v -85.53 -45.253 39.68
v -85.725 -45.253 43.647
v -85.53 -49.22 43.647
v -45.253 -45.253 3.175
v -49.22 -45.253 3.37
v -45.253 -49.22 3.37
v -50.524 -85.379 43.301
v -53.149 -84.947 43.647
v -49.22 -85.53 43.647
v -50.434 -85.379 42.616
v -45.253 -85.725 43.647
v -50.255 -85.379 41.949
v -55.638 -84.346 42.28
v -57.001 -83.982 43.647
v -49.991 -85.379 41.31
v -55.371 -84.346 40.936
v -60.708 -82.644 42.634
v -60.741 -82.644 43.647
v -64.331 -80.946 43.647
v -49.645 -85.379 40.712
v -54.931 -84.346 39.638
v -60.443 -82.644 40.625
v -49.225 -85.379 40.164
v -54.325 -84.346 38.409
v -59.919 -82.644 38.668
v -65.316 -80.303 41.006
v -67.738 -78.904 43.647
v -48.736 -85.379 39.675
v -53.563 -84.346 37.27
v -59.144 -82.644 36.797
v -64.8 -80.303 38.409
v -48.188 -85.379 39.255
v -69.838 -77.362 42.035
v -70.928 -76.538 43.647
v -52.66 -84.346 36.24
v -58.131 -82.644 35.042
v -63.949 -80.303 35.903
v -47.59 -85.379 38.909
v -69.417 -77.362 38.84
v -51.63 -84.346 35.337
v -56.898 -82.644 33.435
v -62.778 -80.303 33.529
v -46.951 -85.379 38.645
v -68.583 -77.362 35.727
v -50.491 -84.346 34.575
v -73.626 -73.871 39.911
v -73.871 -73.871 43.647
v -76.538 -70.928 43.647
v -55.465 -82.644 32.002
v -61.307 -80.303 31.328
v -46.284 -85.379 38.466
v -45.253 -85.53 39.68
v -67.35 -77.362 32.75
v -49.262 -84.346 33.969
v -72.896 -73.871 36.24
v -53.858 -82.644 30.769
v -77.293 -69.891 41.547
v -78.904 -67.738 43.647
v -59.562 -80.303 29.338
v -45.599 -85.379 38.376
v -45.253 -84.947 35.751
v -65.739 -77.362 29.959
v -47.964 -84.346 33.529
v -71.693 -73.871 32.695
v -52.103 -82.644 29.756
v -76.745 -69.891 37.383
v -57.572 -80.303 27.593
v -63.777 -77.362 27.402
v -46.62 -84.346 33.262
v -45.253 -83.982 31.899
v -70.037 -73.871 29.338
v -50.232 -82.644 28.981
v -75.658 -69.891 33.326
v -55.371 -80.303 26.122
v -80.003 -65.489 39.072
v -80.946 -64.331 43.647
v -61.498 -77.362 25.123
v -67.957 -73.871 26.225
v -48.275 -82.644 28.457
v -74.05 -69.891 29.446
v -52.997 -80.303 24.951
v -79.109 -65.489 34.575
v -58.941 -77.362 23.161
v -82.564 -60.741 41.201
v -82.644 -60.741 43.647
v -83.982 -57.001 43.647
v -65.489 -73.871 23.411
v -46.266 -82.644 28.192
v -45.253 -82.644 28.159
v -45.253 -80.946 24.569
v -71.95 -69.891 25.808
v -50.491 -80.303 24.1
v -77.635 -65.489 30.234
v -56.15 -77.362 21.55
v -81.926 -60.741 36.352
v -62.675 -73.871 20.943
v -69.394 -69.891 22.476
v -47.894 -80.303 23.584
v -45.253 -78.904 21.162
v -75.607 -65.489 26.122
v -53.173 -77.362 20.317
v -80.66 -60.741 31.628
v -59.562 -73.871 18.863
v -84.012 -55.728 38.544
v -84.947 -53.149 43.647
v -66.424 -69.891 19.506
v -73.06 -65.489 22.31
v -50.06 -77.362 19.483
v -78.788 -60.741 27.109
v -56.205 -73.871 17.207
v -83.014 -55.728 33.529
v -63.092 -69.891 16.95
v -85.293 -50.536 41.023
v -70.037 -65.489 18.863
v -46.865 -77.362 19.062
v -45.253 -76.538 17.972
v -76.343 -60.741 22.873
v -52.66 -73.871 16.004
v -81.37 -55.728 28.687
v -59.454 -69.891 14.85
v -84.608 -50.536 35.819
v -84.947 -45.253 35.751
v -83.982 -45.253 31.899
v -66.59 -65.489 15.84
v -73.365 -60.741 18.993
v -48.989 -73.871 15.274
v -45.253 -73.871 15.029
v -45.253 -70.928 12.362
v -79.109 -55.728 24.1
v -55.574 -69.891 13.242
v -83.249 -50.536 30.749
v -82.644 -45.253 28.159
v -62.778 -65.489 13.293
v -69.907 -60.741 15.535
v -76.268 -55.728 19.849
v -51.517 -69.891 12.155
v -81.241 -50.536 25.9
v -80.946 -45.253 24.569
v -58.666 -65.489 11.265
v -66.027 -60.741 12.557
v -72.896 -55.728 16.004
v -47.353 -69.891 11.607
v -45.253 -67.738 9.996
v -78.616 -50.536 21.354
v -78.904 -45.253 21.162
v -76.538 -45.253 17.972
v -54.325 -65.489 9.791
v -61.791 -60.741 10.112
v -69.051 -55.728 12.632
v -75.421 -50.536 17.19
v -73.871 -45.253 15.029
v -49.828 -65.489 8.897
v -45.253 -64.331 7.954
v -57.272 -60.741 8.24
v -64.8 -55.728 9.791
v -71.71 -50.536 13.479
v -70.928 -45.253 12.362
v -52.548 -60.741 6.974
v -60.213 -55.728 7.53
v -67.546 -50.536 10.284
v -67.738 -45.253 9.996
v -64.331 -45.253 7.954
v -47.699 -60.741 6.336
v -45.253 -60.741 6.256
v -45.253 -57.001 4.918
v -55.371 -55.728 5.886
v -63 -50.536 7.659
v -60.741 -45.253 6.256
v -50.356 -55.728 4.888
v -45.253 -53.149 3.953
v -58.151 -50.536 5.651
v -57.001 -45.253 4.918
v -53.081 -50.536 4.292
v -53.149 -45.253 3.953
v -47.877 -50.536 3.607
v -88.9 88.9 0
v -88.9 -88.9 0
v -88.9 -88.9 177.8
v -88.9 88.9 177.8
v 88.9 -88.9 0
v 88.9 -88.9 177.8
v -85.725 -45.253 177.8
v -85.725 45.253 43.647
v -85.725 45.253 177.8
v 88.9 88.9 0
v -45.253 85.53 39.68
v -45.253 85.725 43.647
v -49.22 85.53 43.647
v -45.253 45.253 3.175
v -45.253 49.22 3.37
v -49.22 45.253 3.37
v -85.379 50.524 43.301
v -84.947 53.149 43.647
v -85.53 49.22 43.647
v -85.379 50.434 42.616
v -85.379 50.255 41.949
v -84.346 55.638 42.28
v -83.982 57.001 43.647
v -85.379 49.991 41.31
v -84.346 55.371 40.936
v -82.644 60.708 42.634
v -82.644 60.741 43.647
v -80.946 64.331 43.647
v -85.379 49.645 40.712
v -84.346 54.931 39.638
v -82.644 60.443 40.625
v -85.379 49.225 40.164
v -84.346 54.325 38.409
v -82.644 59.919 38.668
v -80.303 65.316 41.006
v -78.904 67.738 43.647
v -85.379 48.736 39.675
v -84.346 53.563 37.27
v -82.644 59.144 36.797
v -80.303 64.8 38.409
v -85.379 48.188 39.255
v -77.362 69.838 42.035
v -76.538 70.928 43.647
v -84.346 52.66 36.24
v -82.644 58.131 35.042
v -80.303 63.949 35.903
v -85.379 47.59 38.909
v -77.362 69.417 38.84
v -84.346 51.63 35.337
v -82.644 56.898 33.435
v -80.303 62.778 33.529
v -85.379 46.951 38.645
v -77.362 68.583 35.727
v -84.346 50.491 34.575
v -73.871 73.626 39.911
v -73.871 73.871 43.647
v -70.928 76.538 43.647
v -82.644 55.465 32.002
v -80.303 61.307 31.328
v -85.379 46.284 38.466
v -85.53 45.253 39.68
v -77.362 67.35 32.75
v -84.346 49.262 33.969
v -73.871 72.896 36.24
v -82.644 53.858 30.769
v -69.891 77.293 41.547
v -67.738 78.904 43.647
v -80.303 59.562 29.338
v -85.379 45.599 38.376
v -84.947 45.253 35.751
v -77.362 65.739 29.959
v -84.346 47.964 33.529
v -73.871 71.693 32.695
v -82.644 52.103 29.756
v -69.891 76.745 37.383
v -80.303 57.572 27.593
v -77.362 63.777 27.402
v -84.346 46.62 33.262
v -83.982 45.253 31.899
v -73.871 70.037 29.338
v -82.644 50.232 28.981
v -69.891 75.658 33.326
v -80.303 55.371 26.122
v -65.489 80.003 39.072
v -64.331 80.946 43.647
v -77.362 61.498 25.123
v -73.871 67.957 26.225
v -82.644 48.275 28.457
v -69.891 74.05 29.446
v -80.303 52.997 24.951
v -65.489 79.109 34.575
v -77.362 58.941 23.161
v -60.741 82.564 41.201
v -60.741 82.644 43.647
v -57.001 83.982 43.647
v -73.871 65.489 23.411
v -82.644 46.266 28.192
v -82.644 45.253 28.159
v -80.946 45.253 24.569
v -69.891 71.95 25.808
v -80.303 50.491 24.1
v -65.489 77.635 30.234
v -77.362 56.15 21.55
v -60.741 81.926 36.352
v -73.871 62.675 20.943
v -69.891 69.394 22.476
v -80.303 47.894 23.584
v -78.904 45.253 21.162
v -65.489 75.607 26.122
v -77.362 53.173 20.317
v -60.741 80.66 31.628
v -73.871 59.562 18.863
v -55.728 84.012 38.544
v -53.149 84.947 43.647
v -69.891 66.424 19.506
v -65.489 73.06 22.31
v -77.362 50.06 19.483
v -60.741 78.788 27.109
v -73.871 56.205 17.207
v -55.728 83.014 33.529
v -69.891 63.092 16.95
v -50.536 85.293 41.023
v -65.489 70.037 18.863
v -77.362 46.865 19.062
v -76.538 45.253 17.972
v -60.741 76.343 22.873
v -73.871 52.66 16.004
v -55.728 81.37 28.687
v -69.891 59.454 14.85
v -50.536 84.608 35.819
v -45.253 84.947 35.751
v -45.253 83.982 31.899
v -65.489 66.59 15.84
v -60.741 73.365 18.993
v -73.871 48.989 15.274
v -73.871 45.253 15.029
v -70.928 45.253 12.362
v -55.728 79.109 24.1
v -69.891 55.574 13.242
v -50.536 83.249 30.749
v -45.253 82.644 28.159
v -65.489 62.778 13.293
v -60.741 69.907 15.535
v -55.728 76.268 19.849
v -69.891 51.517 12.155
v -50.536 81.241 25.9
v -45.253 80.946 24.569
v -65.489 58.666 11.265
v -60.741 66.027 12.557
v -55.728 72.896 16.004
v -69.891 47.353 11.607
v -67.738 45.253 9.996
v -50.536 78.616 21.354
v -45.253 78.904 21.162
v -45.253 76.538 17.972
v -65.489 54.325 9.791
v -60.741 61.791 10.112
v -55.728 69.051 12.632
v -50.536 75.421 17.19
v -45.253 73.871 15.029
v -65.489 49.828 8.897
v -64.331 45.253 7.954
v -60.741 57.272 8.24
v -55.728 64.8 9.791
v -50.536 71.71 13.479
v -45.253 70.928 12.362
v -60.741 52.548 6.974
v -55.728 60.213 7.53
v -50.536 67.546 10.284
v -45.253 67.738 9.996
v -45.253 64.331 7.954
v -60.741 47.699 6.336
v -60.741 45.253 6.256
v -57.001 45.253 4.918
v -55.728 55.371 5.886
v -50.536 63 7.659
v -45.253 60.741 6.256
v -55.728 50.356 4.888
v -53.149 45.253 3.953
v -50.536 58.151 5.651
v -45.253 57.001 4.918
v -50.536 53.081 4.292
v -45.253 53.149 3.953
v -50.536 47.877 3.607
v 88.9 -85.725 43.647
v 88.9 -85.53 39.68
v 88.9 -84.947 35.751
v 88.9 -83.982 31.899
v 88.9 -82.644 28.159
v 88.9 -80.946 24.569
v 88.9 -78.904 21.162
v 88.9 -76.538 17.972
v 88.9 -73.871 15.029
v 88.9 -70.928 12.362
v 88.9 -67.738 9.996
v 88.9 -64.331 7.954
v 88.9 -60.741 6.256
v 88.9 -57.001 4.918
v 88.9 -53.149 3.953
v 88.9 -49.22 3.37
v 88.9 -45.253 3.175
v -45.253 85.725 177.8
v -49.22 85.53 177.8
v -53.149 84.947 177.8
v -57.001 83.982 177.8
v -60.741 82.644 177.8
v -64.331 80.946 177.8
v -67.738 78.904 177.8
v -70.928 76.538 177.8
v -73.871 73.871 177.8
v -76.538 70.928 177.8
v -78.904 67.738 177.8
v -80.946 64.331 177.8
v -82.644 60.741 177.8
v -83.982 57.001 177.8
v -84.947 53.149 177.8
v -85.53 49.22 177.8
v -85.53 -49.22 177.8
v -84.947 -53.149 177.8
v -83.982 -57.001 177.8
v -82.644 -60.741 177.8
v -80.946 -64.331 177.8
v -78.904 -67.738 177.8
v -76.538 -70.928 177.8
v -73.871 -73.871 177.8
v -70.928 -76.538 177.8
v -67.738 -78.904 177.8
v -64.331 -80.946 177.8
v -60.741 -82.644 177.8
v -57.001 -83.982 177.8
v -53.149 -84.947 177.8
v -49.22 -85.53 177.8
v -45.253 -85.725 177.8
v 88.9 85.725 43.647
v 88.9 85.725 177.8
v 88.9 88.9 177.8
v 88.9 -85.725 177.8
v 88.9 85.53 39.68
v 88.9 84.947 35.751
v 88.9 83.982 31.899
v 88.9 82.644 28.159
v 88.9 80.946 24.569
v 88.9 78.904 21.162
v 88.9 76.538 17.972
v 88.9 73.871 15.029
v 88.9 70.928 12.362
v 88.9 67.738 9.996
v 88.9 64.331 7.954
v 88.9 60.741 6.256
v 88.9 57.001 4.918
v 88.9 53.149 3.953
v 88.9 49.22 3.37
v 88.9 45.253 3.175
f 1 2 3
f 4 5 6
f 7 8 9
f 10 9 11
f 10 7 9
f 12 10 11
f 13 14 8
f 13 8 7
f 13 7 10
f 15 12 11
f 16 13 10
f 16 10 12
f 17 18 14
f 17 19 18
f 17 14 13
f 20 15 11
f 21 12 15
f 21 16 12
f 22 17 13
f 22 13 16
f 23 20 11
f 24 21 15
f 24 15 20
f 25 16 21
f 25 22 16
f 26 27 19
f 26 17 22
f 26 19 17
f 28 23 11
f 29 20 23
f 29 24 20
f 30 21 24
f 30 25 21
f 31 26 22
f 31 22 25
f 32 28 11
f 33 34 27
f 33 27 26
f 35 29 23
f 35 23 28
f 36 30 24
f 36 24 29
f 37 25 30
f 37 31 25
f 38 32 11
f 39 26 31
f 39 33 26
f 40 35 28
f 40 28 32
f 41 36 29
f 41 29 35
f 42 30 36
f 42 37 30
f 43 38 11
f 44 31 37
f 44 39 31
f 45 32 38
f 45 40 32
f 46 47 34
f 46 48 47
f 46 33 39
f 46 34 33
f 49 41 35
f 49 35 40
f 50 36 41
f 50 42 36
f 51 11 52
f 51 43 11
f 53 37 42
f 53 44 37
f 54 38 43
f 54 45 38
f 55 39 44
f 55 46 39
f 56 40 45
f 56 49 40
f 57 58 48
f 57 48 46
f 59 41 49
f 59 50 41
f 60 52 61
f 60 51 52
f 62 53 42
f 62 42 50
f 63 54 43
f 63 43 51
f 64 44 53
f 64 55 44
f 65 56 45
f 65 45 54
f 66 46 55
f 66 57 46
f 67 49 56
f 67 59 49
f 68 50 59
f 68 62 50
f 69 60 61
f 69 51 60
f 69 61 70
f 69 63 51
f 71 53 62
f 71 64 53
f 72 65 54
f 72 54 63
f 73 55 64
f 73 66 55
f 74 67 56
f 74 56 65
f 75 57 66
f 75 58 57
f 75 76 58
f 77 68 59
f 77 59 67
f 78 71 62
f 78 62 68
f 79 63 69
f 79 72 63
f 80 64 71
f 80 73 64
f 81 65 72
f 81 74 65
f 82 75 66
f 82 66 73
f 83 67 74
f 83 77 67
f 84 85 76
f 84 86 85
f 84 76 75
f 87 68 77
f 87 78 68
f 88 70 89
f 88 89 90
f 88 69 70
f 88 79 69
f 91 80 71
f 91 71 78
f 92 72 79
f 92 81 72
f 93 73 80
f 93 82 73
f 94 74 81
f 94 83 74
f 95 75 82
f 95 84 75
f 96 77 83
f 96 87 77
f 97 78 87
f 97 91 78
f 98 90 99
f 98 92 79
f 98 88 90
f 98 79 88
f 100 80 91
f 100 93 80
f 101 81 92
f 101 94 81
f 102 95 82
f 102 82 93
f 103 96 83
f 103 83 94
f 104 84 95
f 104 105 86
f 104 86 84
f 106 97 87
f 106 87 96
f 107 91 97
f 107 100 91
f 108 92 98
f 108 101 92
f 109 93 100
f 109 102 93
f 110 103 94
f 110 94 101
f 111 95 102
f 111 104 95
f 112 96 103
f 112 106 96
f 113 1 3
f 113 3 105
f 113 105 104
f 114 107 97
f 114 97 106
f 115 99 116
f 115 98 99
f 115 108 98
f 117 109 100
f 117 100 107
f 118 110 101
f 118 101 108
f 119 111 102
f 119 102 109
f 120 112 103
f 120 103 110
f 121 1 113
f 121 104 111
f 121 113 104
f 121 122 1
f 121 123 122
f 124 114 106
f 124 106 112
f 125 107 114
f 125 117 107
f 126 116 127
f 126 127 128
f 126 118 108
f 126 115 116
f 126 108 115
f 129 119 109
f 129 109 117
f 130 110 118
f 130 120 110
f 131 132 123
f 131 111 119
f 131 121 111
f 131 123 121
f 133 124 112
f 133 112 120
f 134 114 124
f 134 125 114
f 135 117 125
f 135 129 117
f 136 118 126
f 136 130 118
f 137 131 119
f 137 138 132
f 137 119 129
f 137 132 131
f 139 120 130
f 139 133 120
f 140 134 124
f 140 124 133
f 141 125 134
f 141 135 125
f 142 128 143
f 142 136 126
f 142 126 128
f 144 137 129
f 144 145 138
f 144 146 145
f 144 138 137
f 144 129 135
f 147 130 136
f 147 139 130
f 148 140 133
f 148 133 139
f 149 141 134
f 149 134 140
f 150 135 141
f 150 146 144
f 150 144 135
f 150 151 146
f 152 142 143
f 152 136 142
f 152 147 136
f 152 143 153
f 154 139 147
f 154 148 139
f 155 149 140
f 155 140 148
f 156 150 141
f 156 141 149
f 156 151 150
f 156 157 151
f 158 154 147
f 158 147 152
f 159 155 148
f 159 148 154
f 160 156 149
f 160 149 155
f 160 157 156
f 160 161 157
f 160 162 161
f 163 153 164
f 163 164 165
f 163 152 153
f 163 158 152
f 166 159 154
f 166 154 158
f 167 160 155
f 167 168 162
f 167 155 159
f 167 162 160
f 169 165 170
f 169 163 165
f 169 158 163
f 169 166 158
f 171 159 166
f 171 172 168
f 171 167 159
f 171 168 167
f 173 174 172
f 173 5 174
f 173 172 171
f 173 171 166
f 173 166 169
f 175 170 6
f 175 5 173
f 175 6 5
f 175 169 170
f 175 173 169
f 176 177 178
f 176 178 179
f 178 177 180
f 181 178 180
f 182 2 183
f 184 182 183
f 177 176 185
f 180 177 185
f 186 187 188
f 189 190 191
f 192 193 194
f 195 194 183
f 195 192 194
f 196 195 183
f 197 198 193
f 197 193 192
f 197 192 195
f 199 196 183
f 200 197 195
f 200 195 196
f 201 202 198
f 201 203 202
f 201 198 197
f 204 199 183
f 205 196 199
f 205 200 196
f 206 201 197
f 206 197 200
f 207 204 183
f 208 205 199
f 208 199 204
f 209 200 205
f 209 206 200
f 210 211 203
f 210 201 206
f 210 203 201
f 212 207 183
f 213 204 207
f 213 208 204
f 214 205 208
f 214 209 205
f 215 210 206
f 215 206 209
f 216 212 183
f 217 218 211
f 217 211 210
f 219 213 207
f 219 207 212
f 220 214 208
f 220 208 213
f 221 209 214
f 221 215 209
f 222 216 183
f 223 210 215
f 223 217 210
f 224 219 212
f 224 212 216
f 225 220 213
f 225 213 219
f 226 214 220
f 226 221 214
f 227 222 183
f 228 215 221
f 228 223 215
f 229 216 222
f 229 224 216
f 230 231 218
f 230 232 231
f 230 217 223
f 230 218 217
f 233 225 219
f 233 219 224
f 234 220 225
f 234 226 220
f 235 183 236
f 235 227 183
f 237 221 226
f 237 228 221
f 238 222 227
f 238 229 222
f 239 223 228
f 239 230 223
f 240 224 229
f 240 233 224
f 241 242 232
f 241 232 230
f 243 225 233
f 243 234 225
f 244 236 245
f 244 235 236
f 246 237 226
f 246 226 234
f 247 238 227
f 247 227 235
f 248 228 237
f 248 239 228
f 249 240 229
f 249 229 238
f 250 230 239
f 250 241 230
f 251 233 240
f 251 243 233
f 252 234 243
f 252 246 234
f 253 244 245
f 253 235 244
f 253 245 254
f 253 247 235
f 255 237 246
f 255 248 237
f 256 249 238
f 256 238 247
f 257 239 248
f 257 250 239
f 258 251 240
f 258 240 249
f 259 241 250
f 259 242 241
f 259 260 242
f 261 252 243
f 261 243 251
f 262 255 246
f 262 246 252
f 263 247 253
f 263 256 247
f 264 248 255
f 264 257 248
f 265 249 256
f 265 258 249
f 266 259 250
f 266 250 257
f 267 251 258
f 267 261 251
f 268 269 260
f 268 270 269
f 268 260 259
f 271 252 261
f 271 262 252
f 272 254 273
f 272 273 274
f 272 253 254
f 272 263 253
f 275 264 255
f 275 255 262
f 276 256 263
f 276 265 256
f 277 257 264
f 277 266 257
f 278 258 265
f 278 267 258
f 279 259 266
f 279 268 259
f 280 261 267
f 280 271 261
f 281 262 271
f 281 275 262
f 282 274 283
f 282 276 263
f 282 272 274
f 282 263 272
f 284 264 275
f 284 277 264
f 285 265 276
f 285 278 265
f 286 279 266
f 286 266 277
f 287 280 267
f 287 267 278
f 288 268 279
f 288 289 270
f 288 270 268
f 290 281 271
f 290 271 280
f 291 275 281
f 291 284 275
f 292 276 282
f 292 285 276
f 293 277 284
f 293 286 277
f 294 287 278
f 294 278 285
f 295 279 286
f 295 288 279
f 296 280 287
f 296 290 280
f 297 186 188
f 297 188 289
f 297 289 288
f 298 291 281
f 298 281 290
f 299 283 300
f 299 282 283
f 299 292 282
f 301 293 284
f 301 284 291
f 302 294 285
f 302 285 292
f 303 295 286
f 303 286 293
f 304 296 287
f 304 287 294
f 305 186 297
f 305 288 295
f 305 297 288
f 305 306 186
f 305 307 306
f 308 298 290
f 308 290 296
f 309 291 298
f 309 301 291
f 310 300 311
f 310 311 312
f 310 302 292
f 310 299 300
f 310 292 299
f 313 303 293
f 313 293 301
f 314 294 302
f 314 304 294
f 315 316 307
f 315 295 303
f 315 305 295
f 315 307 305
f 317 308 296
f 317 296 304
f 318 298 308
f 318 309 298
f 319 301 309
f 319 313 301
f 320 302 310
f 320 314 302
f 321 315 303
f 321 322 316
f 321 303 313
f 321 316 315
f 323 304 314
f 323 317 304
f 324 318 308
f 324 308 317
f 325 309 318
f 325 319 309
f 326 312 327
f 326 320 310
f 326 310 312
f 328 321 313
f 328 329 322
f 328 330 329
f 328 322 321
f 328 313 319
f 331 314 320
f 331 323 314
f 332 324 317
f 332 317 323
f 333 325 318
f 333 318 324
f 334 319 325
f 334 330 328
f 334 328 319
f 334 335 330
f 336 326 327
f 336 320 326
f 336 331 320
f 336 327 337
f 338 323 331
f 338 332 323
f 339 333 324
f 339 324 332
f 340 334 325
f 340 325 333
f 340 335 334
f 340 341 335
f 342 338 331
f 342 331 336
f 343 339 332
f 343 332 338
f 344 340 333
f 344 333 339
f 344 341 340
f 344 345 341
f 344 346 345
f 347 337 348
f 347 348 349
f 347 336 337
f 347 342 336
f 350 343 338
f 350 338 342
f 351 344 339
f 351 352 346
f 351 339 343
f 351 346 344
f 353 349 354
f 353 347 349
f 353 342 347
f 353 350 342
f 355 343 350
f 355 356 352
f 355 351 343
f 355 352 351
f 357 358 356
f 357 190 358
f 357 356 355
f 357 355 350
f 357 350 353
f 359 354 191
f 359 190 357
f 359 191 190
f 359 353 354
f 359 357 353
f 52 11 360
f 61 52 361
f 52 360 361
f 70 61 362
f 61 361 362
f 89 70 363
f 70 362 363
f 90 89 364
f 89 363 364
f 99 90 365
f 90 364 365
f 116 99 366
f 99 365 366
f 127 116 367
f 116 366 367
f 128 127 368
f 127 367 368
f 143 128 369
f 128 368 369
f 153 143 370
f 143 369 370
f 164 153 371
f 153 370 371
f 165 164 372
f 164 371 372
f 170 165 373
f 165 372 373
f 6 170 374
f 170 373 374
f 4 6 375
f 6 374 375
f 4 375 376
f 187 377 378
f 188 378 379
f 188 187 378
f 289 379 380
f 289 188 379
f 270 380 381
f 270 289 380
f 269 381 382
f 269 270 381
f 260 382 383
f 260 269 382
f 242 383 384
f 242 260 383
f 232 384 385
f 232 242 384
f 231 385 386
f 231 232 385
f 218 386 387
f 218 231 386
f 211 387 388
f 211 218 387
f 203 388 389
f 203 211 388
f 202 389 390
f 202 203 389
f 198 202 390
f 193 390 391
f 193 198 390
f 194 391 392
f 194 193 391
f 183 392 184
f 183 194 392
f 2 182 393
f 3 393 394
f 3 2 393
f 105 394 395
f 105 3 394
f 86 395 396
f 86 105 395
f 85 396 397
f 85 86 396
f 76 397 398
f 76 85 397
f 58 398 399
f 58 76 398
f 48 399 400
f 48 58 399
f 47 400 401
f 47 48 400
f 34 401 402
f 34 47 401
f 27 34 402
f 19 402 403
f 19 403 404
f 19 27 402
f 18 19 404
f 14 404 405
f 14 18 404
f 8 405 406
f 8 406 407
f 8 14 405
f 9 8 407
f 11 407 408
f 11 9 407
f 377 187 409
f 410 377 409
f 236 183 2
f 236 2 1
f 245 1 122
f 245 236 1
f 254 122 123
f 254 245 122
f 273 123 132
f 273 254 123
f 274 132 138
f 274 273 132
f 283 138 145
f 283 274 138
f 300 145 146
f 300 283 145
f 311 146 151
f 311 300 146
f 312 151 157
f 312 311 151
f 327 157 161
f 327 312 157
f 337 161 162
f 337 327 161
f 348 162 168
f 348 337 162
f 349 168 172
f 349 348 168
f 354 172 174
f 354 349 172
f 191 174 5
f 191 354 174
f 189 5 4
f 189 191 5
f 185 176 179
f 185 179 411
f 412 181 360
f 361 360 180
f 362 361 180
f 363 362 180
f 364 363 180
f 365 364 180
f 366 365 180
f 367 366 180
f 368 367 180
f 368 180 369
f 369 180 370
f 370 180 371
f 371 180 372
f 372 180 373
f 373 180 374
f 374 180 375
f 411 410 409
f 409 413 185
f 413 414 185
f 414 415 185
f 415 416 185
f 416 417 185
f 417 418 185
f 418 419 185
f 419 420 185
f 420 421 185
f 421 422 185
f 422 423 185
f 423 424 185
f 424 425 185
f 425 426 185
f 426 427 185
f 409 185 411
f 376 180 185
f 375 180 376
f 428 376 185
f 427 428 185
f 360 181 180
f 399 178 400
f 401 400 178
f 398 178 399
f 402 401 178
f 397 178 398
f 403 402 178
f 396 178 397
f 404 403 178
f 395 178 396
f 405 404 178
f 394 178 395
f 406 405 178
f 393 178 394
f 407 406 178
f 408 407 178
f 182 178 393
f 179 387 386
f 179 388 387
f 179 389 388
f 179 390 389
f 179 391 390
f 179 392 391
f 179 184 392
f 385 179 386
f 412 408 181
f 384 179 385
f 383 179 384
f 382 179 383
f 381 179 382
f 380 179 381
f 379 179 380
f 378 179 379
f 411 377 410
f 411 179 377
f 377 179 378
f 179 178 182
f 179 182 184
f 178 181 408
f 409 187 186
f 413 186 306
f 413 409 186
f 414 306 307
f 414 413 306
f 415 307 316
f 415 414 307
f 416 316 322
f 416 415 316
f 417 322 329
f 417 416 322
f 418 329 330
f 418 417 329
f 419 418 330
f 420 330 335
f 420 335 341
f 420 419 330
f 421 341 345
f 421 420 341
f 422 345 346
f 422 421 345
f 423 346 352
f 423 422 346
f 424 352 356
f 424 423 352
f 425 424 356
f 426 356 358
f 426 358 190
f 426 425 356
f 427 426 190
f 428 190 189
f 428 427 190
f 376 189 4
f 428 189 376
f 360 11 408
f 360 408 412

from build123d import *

# Parameters (mm, degrees)
F0_W     = 177.8
F0_H     = 177.8
F1_DEPTH = 177.8
F2_W     = 174.625
F2_H     = 171.45
F3_DEPTH = 174.625
F4_R     = 40.471876


with BuildPart() as f1:
    # F0 (on Top) → F1 (new body)
    with BuildSketch(Plane.XY):
        Rectangle(F0_W, F0_H)
    extrude(amount=F1_DEPTH)

    # F2 (on face) → F3 (cut)
    with BuildSketch(Plane.XY.offset(177.8)):
        with Locations((1.5875, 0)):
            Rectangle(F2_W, F2_H)
    extrude(amount=-F3_DEPTH, mode=Mode.SUBTRACT)

    # F4
    f4_edges = [f1.edges().sort_by_distance(p)[0] for p in [
        (1.5875, 85.725, 3.175),
        (-85.725, 85.725, 90.4875),
        (-85.725, 0, 3.175),
        (-85.725, -85.725, 90.4875),
        (1.5875, -85.725, 3.175),
    ]]
    fillet(f4_edges, radius=F4_R)


solid = f1.part
